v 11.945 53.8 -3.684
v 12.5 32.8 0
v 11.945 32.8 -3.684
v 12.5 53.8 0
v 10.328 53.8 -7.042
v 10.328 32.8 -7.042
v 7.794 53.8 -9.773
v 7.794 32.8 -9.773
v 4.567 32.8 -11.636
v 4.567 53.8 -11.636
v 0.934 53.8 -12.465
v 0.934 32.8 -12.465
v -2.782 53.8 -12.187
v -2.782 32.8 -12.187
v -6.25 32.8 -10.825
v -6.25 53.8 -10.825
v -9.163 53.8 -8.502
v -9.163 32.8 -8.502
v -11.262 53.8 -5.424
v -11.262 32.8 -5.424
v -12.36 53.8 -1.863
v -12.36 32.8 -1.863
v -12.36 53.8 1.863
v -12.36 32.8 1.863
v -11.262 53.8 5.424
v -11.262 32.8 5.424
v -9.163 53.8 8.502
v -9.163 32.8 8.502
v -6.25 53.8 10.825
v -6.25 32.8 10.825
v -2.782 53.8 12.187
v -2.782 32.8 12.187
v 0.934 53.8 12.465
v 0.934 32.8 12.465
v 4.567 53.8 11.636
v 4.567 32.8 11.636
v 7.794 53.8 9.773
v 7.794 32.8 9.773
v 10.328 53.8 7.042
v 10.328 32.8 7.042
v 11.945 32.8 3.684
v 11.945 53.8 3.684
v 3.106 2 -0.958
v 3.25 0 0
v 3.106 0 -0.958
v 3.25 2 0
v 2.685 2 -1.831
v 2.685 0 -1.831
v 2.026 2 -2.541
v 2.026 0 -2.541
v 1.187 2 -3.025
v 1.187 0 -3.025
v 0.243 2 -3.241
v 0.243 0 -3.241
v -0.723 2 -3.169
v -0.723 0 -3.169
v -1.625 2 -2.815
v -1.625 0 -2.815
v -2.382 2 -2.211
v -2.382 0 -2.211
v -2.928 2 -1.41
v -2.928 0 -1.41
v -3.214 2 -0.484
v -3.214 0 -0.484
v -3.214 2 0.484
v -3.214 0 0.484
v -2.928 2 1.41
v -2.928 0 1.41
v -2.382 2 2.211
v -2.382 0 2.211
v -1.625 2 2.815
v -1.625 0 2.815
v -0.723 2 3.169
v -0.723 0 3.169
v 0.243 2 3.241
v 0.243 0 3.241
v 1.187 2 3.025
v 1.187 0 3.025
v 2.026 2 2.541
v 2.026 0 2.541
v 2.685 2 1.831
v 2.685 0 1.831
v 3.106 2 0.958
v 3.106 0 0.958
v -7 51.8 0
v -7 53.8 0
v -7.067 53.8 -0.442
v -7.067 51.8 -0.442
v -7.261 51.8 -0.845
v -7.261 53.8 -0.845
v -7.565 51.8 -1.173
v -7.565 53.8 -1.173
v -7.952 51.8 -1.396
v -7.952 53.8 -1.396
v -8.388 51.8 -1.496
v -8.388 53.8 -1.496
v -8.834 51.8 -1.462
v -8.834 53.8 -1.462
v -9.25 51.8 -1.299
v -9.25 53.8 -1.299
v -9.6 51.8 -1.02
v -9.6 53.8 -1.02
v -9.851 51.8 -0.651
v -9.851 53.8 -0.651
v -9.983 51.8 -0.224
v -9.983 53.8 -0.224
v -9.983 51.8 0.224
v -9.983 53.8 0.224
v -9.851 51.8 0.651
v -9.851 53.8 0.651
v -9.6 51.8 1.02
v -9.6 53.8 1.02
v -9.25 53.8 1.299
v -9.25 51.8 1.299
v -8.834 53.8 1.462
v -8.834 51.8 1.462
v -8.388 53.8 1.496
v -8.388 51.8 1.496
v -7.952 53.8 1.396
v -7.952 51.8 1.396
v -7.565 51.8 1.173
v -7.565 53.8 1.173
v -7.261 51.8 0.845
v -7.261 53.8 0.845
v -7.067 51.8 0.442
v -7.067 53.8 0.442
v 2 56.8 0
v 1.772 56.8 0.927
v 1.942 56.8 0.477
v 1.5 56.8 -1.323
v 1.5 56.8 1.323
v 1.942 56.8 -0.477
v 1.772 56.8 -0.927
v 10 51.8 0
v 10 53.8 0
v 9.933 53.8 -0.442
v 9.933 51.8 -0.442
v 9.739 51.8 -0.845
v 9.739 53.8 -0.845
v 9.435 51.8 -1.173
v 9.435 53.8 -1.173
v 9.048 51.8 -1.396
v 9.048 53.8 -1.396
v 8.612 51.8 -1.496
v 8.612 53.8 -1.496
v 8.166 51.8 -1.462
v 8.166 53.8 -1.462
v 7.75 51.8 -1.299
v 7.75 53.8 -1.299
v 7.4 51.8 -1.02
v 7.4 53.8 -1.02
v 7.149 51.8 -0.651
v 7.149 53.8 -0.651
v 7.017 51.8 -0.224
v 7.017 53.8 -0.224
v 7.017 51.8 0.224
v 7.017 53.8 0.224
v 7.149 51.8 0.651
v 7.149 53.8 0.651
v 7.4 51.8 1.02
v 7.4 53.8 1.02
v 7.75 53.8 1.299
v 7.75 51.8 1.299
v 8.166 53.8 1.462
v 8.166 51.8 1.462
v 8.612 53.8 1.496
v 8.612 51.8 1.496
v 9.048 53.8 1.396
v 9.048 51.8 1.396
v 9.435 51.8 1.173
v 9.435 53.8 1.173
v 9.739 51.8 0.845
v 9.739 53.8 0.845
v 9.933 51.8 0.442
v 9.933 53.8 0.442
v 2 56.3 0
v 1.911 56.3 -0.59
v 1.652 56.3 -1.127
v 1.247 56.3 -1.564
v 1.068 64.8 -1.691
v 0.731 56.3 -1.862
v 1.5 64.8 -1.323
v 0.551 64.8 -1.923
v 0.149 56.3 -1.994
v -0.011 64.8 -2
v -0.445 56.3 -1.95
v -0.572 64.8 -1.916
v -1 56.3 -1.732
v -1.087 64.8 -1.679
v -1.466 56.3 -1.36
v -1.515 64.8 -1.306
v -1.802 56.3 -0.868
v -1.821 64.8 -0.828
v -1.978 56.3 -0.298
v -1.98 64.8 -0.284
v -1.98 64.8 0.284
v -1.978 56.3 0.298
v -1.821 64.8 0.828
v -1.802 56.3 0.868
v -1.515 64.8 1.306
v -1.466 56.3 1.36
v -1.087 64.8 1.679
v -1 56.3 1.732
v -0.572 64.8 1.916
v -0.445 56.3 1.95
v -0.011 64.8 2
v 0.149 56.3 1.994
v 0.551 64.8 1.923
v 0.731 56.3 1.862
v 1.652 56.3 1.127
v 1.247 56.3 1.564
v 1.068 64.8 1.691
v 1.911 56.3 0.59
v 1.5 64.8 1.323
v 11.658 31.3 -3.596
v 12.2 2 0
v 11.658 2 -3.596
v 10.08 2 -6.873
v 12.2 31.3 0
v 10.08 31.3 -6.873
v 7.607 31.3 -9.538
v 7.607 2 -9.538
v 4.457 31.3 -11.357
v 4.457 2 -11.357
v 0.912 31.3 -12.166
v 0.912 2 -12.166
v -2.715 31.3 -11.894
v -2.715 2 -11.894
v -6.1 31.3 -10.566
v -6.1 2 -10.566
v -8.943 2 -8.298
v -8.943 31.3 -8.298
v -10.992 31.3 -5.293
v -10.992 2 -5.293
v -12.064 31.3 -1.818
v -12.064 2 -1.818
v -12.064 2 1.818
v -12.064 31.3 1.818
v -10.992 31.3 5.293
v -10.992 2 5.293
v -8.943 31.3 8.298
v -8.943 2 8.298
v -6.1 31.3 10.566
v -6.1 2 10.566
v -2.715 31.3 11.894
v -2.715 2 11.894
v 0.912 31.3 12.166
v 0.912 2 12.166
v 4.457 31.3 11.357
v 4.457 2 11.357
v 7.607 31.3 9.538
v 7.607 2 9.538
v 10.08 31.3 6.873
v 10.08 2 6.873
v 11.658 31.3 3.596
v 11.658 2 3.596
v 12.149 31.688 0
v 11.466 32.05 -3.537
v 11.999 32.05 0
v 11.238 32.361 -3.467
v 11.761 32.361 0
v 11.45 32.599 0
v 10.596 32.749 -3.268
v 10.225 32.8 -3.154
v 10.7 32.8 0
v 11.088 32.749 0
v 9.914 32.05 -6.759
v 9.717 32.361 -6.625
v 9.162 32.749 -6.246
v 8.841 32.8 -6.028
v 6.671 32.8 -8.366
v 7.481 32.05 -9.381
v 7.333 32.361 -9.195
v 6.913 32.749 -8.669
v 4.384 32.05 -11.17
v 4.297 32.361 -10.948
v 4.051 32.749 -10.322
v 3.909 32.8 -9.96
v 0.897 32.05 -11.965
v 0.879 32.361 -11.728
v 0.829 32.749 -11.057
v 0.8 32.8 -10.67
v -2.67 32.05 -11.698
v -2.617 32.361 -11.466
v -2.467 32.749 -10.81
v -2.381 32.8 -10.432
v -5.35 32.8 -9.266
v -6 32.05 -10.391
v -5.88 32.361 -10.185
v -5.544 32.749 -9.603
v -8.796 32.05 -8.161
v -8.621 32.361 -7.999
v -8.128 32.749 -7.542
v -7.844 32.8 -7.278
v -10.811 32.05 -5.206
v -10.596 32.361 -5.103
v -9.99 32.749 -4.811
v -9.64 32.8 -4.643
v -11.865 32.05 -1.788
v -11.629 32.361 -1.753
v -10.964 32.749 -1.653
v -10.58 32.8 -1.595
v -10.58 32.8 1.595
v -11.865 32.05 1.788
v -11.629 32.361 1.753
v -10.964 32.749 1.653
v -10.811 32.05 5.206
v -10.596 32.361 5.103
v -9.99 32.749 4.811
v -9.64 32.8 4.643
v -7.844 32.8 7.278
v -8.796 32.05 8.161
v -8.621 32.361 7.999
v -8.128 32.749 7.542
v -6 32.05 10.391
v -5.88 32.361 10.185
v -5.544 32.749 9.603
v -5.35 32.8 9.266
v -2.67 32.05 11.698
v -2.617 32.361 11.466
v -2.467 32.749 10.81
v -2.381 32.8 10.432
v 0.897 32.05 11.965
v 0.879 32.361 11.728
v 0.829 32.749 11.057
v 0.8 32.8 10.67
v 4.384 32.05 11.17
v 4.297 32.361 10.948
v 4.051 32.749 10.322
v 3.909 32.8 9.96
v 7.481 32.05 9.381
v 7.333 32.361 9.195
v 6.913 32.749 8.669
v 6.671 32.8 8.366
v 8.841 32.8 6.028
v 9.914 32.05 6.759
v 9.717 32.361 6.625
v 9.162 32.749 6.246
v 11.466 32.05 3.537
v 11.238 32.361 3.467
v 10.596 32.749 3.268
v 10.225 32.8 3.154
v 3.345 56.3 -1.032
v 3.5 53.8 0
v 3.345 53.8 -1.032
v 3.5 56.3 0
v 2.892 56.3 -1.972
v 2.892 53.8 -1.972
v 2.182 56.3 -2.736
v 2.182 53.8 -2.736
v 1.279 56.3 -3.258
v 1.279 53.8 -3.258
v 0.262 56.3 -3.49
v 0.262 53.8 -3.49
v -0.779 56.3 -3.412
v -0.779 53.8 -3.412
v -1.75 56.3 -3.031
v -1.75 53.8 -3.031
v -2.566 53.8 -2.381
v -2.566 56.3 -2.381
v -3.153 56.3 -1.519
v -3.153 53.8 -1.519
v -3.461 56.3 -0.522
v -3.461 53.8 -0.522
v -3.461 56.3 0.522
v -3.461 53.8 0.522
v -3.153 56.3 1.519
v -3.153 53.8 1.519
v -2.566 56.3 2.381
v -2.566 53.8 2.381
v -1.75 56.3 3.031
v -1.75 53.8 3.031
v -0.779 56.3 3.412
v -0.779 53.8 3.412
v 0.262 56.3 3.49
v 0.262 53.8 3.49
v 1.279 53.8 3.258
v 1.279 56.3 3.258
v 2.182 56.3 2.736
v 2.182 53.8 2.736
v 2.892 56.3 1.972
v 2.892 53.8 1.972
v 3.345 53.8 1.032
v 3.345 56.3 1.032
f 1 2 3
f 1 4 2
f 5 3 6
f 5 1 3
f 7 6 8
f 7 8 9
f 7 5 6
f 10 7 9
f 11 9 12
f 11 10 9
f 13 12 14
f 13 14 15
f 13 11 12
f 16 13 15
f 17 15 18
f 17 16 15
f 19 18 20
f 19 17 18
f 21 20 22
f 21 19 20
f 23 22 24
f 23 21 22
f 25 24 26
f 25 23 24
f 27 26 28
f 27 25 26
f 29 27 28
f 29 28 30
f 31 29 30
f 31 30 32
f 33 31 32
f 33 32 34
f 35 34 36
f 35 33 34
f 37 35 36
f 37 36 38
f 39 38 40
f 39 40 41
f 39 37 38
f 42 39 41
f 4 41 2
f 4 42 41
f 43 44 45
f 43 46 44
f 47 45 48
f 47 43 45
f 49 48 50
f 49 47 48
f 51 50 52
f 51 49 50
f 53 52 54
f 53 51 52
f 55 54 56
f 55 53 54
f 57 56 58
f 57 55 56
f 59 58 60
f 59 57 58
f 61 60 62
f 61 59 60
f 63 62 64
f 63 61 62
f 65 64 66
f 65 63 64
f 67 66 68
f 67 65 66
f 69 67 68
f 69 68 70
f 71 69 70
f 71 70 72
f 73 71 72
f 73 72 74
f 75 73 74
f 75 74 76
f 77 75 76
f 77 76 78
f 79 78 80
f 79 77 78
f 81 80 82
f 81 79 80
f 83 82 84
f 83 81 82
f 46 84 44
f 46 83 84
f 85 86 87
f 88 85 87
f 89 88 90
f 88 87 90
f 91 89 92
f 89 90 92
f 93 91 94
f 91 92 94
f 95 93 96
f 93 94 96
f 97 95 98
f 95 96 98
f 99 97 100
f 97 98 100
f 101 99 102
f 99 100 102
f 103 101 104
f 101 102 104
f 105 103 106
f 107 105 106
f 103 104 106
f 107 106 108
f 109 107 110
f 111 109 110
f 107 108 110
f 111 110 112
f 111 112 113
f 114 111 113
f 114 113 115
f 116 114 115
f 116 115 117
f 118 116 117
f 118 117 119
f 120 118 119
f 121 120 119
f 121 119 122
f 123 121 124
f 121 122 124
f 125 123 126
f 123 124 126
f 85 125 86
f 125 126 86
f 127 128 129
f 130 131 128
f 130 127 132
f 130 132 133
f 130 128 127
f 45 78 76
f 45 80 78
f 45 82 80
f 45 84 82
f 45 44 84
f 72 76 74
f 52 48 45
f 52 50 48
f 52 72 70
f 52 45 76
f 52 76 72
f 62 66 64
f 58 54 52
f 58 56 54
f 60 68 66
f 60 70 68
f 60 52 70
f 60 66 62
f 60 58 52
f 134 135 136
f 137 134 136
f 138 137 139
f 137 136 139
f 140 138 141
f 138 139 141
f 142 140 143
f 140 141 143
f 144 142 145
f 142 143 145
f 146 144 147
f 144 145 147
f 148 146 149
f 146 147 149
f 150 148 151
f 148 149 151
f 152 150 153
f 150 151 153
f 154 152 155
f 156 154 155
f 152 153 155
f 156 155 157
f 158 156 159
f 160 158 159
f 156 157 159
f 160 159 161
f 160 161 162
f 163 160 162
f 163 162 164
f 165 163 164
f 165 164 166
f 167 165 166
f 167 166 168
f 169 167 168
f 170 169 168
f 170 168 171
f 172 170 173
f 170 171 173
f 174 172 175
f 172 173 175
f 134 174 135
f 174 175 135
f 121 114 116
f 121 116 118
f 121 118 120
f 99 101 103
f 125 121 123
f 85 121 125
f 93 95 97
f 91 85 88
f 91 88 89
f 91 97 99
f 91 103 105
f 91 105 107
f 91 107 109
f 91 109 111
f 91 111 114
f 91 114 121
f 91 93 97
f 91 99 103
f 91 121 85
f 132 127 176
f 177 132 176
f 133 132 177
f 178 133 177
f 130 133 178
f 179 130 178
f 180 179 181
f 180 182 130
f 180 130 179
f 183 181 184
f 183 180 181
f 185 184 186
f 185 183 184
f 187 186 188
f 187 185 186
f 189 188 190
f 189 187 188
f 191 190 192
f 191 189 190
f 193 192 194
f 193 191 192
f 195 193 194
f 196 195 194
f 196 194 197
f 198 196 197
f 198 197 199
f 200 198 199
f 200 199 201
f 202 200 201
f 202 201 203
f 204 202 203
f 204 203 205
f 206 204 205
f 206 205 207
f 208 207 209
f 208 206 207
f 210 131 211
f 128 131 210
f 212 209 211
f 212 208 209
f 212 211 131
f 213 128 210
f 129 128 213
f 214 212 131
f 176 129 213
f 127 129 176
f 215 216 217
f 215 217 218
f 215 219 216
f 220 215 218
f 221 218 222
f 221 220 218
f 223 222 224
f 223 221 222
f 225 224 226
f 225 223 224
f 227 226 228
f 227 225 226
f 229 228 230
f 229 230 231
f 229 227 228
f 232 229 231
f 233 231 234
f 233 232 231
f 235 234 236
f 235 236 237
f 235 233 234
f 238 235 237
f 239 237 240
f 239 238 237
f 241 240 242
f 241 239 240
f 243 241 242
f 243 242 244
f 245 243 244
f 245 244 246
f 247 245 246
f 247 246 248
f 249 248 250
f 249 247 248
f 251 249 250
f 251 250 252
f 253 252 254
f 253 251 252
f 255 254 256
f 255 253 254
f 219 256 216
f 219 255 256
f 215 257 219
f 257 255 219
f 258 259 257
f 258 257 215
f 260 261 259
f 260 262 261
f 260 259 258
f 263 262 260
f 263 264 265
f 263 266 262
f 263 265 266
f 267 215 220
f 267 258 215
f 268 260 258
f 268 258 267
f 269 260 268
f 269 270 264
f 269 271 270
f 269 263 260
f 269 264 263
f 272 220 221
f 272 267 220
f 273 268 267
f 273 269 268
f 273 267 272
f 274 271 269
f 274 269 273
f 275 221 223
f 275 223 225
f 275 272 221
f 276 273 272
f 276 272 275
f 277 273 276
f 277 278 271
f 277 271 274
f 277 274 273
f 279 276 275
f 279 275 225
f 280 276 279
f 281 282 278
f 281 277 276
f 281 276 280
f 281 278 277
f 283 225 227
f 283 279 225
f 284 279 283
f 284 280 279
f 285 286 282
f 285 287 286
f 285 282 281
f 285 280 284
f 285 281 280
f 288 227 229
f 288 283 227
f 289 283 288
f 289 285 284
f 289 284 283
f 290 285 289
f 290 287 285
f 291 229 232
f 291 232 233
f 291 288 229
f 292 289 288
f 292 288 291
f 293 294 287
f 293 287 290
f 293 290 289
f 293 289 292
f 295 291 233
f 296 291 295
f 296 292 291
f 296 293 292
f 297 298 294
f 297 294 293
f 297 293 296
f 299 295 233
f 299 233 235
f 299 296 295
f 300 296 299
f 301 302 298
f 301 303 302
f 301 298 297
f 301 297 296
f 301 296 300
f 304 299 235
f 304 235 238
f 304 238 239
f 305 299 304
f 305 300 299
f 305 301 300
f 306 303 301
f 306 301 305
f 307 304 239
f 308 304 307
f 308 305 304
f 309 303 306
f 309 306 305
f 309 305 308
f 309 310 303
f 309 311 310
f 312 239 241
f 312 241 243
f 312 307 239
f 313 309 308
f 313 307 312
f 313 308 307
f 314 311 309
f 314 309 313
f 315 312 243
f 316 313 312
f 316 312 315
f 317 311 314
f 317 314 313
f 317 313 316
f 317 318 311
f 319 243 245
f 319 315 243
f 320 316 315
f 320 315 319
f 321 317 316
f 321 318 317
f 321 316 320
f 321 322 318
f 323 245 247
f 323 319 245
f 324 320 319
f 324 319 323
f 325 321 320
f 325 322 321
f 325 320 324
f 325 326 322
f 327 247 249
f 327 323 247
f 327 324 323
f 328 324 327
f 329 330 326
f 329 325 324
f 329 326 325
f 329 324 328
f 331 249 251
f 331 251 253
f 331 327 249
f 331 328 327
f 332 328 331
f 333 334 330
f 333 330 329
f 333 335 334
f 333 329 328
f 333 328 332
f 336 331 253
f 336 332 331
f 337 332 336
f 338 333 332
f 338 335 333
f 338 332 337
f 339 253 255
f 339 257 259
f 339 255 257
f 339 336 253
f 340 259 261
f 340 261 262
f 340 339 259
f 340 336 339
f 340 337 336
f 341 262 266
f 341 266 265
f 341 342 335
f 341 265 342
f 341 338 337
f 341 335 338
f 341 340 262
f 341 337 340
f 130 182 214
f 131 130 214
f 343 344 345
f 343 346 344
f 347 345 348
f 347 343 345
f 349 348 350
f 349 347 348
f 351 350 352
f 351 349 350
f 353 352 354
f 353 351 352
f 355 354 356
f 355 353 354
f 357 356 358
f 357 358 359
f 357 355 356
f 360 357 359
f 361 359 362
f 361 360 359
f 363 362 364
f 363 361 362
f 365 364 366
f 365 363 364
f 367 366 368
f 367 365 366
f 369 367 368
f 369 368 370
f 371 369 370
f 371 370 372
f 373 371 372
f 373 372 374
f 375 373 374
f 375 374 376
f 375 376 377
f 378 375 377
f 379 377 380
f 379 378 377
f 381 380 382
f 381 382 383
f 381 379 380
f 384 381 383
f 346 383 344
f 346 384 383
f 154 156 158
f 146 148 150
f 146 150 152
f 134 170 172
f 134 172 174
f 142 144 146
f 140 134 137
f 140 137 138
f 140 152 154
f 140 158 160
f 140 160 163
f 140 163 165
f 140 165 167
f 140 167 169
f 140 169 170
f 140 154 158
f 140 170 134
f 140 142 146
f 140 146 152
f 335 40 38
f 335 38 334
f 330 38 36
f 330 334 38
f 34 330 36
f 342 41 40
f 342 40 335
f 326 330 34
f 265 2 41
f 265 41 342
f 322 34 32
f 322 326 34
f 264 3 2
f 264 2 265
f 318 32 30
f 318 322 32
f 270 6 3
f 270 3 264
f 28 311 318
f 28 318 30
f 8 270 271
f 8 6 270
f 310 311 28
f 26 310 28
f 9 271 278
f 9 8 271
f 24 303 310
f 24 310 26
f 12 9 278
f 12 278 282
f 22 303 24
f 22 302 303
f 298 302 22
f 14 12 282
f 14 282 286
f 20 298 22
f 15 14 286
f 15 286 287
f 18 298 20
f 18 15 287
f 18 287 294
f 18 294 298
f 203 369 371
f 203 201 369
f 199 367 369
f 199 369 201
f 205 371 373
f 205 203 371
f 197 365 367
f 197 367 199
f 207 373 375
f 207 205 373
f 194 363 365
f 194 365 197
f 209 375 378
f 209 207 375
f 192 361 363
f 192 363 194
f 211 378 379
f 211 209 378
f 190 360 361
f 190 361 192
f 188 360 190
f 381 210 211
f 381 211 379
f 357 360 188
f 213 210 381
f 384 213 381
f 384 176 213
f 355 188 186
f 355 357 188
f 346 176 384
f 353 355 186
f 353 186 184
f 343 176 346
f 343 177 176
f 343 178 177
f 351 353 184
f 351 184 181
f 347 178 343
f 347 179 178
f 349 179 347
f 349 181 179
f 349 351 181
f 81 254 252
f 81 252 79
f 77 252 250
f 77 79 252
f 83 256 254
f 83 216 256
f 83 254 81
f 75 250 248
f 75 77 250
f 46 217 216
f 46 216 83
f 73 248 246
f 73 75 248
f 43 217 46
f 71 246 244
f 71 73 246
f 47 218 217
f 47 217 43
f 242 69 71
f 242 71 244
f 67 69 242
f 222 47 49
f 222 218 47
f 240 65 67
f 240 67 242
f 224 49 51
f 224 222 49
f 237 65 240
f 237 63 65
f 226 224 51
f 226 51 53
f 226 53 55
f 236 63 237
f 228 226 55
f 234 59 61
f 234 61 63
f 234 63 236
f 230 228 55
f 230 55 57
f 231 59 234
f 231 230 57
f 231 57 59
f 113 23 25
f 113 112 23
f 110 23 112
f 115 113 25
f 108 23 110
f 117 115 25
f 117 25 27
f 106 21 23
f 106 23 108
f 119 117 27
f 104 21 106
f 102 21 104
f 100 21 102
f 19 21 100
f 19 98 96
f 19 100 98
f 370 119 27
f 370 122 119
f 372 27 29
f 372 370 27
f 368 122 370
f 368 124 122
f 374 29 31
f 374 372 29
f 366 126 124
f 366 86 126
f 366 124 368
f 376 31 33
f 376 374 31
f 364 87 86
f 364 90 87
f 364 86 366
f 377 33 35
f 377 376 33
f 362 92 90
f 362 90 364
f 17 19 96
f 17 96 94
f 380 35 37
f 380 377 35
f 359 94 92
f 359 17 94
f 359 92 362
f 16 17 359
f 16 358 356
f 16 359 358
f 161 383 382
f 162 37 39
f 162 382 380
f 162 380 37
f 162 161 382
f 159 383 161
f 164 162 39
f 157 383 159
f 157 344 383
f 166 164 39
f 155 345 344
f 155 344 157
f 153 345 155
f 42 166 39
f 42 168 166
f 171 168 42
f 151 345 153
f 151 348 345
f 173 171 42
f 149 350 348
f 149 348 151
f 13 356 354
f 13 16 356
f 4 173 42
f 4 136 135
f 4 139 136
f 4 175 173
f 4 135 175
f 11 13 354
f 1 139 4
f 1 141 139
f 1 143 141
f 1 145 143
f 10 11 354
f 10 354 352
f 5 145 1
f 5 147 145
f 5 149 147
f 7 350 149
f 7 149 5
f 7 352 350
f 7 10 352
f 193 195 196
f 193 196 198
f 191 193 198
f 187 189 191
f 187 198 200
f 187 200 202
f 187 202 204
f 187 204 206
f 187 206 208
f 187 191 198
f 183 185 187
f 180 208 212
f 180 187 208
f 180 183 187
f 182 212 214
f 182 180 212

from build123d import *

# Parameters (mm, degrees)
ODEBRAT_VYSUNUT_M1_DEPTH = 8
SKICA3_R                 = 1.5
ODEBRAT_VYSUNUT_M2_DEPTH = 2


with BuildPart() as part:
    # Skica1 → Rotovat1 (revolve)
    with BuildSketch(Plane.XY):
        with BuildLine():
            Line((0, 0), (3.25, 0))
            Line((3.25, 0), (3.25, 2))
            Line((3.25, 2), (12.2, 2))
            Line((12.2, 2), (12.2, 31.3))
            ThreePointArc((12.2, 31.3), (11.760660172, 32.360660172), (10.7, 32.8))
            Line((10.7, 32.8), (12.5, 32.8))
            Line((12.5, 32.8), (12.5, 53.8))
            Line((12.5, 53.8), (3.5, 53.8))
            Line((3.5, 53.8), (3.5, 56.3))
            Line((3.5, 56.3), (2, 56.3))
            Line((2, 56.3), (2, 64.8))
            Line((2, 64.8), (0, 64.8))
            Line((0, 64.8), (0, 0))
        make_face()
    revolve(axis=Axis((0, 0, 0), (0, 1, 0)))

    # Skica2 → Odebrat vysunutím1 (cut)
    with BuildSketch(Plane(origin=(0, 64.8, 0), x_dir=(1, 0, 0), z_dir=(0, 1, 0))):
        with BuildLine():
            Line((1.5, 1.322875656), (1.5, -1.322875656))
            ThreePointArc((1.5, -1.322875656), (2, 0), (1.5, 1.322875656))
        make_face()
    extrude(amount=-ODEBRAT_VYSUNUT_M1_DEPTH, mode=Mode.SUBTRACT)

    # Skica3 → Odebrat vysunutím2 (cut)
    with BuildSketch(Plane(origin=(0, 53.8, 0), x_dir=(1, 0, 0), z_dir=(0, 1, 0))):
        with Locations((8.5, 0)):
            Circle(SKICA3_R)
        with Locations((-8.5, 0)):
            Circle(SKICA3_R)
    extrude(amount=-ODEBRAT_VYSUNUT_M2_DEPTH, mode=Mode.SUBTRACT)


solid = part.part
